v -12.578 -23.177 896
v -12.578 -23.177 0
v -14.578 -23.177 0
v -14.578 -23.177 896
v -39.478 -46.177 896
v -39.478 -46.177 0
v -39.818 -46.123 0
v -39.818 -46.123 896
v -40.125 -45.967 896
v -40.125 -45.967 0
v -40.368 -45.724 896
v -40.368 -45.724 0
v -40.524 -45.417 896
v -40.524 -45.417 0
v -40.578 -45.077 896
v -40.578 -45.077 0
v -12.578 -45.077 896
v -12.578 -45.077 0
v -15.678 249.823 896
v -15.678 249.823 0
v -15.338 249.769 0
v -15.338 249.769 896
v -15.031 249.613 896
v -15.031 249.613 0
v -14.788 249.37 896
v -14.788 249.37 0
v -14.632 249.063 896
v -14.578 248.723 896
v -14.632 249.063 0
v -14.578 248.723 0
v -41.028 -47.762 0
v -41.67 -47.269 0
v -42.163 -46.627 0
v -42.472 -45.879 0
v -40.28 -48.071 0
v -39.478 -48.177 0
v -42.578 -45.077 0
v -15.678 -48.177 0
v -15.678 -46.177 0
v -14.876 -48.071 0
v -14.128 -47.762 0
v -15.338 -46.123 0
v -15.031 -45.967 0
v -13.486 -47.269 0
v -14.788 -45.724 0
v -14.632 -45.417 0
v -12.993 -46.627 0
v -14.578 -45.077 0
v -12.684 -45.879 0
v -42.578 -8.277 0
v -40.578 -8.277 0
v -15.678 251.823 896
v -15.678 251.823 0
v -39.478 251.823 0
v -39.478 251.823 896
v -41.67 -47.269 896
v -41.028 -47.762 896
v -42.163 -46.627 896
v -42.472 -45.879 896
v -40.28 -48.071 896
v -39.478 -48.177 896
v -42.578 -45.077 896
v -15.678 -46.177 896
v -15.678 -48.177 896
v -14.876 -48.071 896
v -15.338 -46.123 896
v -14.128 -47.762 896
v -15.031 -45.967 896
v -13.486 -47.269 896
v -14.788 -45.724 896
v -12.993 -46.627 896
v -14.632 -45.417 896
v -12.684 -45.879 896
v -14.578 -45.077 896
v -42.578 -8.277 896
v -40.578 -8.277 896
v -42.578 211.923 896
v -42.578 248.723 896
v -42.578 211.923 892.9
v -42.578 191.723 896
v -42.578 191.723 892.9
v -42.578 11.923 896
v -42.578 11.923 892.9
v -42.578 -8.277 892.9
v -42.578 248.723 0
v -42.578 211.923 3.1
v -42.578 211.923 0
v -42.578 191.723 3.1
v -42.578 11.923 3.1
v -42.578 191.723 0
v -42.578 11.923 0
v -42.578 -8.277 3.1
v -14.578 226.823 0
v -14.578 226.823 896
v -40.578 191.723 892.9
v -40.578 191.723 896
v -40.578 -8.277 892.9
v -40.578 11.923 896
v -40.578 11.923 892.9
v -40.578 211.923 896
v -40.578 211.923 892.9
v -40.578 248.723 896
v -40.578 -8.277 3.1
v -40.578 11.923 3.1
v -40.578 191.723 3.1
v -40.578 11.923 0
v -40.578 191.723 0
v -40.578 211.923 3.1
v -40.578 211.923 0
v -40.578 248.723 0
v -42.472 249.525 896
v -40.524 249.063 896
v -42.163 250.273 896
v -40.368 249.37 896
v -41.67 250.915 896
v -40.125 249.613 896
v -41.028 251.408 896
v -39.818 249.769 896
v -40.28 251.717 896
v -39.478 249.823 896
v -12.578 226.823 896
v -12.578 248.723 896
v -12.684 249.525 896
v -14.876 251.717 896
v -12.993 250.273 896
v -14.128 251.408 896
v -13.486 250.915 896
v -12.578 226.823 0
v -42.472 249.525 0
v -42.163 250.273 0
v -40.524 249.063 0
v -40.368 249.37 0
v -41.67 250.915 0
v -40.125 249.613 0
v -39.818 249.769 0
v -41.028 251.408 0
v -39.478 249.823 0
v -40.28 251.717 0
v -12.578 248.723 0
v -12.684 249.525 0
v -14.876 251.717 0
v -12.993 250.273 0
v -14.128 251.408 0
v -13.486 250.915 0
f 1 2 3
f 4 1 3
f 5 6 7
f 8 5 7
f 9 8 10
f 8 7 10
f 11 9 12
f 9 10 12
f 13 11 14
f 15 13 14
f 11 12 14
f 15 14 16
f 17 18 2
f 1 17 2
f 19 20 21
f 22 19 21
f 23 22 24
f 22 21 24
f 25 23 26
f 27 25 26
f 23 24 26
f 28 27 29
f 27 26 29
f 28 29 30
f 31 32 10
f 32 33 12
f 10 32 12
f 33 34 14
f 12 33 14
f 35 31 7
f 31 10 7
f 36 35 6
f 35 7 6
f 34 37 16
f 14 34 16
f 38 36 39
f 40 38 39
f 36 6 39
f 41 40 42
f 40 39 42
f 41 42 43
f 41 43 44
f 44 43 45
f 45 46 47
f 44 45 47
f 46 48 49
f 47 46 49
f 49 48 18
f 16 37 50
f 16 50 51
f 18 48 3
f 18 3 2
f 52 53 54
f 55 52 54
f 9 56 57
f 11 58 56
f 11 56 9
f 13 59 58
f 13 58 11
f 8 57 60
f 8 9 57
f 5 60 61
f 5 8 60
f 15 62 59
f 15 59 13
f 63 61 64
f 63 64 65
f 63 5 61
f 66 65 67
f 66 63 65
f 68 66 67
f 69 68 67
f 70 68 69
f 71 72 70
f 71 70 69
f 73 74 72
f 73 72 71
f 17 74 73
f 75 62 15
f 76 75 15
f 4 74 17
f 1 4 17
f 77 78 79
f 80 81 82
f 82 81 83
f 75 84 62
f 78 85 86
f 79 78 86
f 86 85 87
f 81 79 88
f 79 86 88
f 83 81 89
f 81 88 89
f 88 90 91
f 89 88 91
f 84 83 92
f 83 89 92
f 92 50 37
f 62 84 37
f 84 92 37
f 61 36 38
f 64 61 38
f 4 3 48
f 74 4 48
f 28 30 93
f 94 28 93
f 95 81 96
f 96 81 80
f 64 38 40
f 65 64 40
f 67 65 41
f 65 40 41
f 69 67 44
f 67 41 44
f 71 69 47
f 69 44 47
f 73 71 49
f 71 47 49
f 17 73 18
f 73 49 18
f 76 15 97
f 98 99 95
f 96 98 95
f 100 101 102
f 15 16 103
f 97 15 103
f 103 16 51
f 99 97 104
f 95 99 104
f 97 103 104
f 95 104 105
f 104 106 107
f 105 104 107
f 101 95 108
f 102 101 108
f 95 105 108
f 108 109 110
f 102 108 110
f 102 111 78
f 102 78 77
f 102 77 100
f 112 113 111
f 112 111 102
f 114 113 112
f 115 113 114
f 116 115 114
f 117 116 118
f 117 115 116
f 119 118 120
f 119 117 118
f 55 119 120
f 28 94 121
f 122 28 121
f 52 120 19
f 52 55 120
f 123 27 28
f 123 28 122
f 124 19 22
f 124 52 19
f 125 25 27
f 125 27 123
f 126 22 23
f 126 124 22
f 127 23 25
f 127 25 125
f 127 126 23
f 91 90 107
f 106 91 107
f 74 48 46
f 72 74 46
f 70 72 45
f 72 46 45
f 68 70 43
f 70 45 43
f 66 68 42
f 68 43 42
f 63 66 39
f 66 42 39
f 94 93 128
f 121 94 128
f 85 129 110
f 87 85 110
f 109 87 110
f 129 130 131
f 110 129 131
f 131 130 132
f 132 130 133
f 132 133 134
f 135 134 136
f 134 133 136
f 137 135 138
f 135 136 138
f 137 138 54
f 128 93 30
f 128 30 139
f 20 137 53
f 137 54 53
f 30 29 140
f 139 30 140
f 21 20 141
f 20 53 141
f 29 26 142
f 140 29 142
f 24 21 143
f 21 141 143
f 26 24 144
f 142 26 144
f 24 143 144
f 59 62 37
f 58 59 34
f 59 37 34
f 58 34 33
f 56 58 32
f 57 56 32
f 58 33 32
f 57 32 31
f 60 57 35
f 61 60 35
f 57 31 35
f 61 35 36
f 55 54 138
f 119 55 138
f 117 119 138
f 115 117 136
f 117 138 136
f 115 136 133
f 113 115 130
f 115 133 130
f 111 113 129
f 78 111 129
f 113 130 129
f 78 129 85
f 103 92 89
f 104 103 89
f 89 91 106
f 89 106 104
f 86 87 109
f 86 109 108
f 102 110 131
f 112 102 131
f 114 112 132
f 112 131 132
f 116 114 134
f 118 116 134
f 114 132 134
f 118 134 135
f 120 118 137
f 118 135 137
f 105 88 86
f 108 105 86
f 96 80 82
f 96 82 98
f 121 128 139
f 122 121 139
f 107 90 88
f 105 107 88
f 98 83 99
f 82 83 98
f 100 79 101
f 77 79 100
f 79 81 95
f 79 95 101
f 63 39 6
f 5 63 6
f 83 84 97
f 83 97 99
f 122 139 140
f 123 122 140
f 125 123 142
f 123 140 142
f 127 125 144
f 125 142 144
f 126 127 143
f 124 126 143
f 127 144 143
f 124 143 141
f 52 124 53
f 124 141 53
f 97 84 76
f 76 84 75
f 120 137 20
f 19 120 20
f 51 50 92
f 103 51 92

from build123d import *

# Parameters (mm, degrees)
SM_BASE_FLANGE_1_DEPTH = 896
SKETCH_4_W             = 3.1
SKETCH_4_H             = 20.2
CUT_EXTRUDE_1_DEPTH    = 10


# Sheet-metal steps are written as plain solids
with BuildPart() as part:
    # Sketch 1 → Базовая кромка1 (new body)
    with BuildSketch(Plane.XY):
        with BuildLine():
            Line((-12.578023183, 226.822978959), (-12.578023183, 248.722978959))
            ThreePointArc((-12.578023183, 248.722978959), (-13.485992161, 250.915009981), (-15.678023183, 251.822978959))
            Line((-15.678023183, 251.822978959), (-39.478023183, 251.822978959))
            ThreePointArc((-39.478023183, 251.822978959), (-41.670054205, 250.915009981), (-42.578023183, 248.722978959))
            Line((-42.578023183, 248.722978959), (-42.578023183, -45.077021041))
            ThreePointArc((-42.578023183, -45.077021041), (-41.670054205, -47.269052063), (-39.478023183, -48.177021041))
            Line((-39.478023183, -48.177021041), (-15.678023183, -48.177021041))
            ThreePointArc((-15.678023183, -48.177021041), (-13.485992161, -47.269052063), (-12.578023183, -45.077021041))
            Line((-12.578023183, -45.077021041), (-12.578023183, -23.177021041))
            Line((-12.578023183, -23.177021041), (-14.578023183, -23.177021041))
            Line((-14.578023183, -23.177021041), (-14.578023183, -45.077021041))
            ThreePointArc((-14.578023183, -45.077021041), (-14.900205724, -45.8548385), (-15.678023183, -46.177021041))
            Line((-15.678023183, -46.177021041), (-39.478023183, -46.177021041))
            ThreePointArc((-39.478023183, -46.177021041), (-40.255840642, -45.8548385), (-40.578023183, -45.077021041))
            Line((-40.578023183, -45.077021041), (-40.578023183, 248.722978959))
            ThreePointArc((-40.578023183, 248.722978959), (-40.255840642, 249.500796418), (-39.478023183, 249.822978959))
            Line((-39.478023183, 249.822978959), (-15.678023183, 249.822978959))
            ThreePointArc((-15.678023183, 249.822978959), (-14.900205724, 249.500796418), (-14.578023183, 248.722978959))
            Line((-14.578023183, 248.722978959), (-14.578023183, 226.822978959))
            Line((-14.578023183, 226.822978959), (-12.578023183, 226.822978959))
        make_face()
    extrude(amount=SM_BASE_FLANGE_1_DEPTH)

    # Эскиз4 → Вырез-Вытянуть1 (cut)
    with BuildSketch(Plane.ZY.offset(42.578023183)):
        with Locations((1.55, 201.822978959)):
            Rectangle(SKETCH_4_W, SKETCH_4_H)
        with Locations((1.55, 1.822978959)):
            Rectangle(SKETCH_4_W, SKETCH_4_H)
        with Locations((894.45, 201.822978959)):
            Rectangle(SKETCH_4_W, SKETCH_4_H)
        with Locations((894.45, 1.822978959)):
            Rectangle(SKETCH_4_W, SKETCH_4_H)
    extrude(amount=-CUT_EXTRUDE_1_DEPTH, mode=Mode.SUBTRACT)


solid = part.part
